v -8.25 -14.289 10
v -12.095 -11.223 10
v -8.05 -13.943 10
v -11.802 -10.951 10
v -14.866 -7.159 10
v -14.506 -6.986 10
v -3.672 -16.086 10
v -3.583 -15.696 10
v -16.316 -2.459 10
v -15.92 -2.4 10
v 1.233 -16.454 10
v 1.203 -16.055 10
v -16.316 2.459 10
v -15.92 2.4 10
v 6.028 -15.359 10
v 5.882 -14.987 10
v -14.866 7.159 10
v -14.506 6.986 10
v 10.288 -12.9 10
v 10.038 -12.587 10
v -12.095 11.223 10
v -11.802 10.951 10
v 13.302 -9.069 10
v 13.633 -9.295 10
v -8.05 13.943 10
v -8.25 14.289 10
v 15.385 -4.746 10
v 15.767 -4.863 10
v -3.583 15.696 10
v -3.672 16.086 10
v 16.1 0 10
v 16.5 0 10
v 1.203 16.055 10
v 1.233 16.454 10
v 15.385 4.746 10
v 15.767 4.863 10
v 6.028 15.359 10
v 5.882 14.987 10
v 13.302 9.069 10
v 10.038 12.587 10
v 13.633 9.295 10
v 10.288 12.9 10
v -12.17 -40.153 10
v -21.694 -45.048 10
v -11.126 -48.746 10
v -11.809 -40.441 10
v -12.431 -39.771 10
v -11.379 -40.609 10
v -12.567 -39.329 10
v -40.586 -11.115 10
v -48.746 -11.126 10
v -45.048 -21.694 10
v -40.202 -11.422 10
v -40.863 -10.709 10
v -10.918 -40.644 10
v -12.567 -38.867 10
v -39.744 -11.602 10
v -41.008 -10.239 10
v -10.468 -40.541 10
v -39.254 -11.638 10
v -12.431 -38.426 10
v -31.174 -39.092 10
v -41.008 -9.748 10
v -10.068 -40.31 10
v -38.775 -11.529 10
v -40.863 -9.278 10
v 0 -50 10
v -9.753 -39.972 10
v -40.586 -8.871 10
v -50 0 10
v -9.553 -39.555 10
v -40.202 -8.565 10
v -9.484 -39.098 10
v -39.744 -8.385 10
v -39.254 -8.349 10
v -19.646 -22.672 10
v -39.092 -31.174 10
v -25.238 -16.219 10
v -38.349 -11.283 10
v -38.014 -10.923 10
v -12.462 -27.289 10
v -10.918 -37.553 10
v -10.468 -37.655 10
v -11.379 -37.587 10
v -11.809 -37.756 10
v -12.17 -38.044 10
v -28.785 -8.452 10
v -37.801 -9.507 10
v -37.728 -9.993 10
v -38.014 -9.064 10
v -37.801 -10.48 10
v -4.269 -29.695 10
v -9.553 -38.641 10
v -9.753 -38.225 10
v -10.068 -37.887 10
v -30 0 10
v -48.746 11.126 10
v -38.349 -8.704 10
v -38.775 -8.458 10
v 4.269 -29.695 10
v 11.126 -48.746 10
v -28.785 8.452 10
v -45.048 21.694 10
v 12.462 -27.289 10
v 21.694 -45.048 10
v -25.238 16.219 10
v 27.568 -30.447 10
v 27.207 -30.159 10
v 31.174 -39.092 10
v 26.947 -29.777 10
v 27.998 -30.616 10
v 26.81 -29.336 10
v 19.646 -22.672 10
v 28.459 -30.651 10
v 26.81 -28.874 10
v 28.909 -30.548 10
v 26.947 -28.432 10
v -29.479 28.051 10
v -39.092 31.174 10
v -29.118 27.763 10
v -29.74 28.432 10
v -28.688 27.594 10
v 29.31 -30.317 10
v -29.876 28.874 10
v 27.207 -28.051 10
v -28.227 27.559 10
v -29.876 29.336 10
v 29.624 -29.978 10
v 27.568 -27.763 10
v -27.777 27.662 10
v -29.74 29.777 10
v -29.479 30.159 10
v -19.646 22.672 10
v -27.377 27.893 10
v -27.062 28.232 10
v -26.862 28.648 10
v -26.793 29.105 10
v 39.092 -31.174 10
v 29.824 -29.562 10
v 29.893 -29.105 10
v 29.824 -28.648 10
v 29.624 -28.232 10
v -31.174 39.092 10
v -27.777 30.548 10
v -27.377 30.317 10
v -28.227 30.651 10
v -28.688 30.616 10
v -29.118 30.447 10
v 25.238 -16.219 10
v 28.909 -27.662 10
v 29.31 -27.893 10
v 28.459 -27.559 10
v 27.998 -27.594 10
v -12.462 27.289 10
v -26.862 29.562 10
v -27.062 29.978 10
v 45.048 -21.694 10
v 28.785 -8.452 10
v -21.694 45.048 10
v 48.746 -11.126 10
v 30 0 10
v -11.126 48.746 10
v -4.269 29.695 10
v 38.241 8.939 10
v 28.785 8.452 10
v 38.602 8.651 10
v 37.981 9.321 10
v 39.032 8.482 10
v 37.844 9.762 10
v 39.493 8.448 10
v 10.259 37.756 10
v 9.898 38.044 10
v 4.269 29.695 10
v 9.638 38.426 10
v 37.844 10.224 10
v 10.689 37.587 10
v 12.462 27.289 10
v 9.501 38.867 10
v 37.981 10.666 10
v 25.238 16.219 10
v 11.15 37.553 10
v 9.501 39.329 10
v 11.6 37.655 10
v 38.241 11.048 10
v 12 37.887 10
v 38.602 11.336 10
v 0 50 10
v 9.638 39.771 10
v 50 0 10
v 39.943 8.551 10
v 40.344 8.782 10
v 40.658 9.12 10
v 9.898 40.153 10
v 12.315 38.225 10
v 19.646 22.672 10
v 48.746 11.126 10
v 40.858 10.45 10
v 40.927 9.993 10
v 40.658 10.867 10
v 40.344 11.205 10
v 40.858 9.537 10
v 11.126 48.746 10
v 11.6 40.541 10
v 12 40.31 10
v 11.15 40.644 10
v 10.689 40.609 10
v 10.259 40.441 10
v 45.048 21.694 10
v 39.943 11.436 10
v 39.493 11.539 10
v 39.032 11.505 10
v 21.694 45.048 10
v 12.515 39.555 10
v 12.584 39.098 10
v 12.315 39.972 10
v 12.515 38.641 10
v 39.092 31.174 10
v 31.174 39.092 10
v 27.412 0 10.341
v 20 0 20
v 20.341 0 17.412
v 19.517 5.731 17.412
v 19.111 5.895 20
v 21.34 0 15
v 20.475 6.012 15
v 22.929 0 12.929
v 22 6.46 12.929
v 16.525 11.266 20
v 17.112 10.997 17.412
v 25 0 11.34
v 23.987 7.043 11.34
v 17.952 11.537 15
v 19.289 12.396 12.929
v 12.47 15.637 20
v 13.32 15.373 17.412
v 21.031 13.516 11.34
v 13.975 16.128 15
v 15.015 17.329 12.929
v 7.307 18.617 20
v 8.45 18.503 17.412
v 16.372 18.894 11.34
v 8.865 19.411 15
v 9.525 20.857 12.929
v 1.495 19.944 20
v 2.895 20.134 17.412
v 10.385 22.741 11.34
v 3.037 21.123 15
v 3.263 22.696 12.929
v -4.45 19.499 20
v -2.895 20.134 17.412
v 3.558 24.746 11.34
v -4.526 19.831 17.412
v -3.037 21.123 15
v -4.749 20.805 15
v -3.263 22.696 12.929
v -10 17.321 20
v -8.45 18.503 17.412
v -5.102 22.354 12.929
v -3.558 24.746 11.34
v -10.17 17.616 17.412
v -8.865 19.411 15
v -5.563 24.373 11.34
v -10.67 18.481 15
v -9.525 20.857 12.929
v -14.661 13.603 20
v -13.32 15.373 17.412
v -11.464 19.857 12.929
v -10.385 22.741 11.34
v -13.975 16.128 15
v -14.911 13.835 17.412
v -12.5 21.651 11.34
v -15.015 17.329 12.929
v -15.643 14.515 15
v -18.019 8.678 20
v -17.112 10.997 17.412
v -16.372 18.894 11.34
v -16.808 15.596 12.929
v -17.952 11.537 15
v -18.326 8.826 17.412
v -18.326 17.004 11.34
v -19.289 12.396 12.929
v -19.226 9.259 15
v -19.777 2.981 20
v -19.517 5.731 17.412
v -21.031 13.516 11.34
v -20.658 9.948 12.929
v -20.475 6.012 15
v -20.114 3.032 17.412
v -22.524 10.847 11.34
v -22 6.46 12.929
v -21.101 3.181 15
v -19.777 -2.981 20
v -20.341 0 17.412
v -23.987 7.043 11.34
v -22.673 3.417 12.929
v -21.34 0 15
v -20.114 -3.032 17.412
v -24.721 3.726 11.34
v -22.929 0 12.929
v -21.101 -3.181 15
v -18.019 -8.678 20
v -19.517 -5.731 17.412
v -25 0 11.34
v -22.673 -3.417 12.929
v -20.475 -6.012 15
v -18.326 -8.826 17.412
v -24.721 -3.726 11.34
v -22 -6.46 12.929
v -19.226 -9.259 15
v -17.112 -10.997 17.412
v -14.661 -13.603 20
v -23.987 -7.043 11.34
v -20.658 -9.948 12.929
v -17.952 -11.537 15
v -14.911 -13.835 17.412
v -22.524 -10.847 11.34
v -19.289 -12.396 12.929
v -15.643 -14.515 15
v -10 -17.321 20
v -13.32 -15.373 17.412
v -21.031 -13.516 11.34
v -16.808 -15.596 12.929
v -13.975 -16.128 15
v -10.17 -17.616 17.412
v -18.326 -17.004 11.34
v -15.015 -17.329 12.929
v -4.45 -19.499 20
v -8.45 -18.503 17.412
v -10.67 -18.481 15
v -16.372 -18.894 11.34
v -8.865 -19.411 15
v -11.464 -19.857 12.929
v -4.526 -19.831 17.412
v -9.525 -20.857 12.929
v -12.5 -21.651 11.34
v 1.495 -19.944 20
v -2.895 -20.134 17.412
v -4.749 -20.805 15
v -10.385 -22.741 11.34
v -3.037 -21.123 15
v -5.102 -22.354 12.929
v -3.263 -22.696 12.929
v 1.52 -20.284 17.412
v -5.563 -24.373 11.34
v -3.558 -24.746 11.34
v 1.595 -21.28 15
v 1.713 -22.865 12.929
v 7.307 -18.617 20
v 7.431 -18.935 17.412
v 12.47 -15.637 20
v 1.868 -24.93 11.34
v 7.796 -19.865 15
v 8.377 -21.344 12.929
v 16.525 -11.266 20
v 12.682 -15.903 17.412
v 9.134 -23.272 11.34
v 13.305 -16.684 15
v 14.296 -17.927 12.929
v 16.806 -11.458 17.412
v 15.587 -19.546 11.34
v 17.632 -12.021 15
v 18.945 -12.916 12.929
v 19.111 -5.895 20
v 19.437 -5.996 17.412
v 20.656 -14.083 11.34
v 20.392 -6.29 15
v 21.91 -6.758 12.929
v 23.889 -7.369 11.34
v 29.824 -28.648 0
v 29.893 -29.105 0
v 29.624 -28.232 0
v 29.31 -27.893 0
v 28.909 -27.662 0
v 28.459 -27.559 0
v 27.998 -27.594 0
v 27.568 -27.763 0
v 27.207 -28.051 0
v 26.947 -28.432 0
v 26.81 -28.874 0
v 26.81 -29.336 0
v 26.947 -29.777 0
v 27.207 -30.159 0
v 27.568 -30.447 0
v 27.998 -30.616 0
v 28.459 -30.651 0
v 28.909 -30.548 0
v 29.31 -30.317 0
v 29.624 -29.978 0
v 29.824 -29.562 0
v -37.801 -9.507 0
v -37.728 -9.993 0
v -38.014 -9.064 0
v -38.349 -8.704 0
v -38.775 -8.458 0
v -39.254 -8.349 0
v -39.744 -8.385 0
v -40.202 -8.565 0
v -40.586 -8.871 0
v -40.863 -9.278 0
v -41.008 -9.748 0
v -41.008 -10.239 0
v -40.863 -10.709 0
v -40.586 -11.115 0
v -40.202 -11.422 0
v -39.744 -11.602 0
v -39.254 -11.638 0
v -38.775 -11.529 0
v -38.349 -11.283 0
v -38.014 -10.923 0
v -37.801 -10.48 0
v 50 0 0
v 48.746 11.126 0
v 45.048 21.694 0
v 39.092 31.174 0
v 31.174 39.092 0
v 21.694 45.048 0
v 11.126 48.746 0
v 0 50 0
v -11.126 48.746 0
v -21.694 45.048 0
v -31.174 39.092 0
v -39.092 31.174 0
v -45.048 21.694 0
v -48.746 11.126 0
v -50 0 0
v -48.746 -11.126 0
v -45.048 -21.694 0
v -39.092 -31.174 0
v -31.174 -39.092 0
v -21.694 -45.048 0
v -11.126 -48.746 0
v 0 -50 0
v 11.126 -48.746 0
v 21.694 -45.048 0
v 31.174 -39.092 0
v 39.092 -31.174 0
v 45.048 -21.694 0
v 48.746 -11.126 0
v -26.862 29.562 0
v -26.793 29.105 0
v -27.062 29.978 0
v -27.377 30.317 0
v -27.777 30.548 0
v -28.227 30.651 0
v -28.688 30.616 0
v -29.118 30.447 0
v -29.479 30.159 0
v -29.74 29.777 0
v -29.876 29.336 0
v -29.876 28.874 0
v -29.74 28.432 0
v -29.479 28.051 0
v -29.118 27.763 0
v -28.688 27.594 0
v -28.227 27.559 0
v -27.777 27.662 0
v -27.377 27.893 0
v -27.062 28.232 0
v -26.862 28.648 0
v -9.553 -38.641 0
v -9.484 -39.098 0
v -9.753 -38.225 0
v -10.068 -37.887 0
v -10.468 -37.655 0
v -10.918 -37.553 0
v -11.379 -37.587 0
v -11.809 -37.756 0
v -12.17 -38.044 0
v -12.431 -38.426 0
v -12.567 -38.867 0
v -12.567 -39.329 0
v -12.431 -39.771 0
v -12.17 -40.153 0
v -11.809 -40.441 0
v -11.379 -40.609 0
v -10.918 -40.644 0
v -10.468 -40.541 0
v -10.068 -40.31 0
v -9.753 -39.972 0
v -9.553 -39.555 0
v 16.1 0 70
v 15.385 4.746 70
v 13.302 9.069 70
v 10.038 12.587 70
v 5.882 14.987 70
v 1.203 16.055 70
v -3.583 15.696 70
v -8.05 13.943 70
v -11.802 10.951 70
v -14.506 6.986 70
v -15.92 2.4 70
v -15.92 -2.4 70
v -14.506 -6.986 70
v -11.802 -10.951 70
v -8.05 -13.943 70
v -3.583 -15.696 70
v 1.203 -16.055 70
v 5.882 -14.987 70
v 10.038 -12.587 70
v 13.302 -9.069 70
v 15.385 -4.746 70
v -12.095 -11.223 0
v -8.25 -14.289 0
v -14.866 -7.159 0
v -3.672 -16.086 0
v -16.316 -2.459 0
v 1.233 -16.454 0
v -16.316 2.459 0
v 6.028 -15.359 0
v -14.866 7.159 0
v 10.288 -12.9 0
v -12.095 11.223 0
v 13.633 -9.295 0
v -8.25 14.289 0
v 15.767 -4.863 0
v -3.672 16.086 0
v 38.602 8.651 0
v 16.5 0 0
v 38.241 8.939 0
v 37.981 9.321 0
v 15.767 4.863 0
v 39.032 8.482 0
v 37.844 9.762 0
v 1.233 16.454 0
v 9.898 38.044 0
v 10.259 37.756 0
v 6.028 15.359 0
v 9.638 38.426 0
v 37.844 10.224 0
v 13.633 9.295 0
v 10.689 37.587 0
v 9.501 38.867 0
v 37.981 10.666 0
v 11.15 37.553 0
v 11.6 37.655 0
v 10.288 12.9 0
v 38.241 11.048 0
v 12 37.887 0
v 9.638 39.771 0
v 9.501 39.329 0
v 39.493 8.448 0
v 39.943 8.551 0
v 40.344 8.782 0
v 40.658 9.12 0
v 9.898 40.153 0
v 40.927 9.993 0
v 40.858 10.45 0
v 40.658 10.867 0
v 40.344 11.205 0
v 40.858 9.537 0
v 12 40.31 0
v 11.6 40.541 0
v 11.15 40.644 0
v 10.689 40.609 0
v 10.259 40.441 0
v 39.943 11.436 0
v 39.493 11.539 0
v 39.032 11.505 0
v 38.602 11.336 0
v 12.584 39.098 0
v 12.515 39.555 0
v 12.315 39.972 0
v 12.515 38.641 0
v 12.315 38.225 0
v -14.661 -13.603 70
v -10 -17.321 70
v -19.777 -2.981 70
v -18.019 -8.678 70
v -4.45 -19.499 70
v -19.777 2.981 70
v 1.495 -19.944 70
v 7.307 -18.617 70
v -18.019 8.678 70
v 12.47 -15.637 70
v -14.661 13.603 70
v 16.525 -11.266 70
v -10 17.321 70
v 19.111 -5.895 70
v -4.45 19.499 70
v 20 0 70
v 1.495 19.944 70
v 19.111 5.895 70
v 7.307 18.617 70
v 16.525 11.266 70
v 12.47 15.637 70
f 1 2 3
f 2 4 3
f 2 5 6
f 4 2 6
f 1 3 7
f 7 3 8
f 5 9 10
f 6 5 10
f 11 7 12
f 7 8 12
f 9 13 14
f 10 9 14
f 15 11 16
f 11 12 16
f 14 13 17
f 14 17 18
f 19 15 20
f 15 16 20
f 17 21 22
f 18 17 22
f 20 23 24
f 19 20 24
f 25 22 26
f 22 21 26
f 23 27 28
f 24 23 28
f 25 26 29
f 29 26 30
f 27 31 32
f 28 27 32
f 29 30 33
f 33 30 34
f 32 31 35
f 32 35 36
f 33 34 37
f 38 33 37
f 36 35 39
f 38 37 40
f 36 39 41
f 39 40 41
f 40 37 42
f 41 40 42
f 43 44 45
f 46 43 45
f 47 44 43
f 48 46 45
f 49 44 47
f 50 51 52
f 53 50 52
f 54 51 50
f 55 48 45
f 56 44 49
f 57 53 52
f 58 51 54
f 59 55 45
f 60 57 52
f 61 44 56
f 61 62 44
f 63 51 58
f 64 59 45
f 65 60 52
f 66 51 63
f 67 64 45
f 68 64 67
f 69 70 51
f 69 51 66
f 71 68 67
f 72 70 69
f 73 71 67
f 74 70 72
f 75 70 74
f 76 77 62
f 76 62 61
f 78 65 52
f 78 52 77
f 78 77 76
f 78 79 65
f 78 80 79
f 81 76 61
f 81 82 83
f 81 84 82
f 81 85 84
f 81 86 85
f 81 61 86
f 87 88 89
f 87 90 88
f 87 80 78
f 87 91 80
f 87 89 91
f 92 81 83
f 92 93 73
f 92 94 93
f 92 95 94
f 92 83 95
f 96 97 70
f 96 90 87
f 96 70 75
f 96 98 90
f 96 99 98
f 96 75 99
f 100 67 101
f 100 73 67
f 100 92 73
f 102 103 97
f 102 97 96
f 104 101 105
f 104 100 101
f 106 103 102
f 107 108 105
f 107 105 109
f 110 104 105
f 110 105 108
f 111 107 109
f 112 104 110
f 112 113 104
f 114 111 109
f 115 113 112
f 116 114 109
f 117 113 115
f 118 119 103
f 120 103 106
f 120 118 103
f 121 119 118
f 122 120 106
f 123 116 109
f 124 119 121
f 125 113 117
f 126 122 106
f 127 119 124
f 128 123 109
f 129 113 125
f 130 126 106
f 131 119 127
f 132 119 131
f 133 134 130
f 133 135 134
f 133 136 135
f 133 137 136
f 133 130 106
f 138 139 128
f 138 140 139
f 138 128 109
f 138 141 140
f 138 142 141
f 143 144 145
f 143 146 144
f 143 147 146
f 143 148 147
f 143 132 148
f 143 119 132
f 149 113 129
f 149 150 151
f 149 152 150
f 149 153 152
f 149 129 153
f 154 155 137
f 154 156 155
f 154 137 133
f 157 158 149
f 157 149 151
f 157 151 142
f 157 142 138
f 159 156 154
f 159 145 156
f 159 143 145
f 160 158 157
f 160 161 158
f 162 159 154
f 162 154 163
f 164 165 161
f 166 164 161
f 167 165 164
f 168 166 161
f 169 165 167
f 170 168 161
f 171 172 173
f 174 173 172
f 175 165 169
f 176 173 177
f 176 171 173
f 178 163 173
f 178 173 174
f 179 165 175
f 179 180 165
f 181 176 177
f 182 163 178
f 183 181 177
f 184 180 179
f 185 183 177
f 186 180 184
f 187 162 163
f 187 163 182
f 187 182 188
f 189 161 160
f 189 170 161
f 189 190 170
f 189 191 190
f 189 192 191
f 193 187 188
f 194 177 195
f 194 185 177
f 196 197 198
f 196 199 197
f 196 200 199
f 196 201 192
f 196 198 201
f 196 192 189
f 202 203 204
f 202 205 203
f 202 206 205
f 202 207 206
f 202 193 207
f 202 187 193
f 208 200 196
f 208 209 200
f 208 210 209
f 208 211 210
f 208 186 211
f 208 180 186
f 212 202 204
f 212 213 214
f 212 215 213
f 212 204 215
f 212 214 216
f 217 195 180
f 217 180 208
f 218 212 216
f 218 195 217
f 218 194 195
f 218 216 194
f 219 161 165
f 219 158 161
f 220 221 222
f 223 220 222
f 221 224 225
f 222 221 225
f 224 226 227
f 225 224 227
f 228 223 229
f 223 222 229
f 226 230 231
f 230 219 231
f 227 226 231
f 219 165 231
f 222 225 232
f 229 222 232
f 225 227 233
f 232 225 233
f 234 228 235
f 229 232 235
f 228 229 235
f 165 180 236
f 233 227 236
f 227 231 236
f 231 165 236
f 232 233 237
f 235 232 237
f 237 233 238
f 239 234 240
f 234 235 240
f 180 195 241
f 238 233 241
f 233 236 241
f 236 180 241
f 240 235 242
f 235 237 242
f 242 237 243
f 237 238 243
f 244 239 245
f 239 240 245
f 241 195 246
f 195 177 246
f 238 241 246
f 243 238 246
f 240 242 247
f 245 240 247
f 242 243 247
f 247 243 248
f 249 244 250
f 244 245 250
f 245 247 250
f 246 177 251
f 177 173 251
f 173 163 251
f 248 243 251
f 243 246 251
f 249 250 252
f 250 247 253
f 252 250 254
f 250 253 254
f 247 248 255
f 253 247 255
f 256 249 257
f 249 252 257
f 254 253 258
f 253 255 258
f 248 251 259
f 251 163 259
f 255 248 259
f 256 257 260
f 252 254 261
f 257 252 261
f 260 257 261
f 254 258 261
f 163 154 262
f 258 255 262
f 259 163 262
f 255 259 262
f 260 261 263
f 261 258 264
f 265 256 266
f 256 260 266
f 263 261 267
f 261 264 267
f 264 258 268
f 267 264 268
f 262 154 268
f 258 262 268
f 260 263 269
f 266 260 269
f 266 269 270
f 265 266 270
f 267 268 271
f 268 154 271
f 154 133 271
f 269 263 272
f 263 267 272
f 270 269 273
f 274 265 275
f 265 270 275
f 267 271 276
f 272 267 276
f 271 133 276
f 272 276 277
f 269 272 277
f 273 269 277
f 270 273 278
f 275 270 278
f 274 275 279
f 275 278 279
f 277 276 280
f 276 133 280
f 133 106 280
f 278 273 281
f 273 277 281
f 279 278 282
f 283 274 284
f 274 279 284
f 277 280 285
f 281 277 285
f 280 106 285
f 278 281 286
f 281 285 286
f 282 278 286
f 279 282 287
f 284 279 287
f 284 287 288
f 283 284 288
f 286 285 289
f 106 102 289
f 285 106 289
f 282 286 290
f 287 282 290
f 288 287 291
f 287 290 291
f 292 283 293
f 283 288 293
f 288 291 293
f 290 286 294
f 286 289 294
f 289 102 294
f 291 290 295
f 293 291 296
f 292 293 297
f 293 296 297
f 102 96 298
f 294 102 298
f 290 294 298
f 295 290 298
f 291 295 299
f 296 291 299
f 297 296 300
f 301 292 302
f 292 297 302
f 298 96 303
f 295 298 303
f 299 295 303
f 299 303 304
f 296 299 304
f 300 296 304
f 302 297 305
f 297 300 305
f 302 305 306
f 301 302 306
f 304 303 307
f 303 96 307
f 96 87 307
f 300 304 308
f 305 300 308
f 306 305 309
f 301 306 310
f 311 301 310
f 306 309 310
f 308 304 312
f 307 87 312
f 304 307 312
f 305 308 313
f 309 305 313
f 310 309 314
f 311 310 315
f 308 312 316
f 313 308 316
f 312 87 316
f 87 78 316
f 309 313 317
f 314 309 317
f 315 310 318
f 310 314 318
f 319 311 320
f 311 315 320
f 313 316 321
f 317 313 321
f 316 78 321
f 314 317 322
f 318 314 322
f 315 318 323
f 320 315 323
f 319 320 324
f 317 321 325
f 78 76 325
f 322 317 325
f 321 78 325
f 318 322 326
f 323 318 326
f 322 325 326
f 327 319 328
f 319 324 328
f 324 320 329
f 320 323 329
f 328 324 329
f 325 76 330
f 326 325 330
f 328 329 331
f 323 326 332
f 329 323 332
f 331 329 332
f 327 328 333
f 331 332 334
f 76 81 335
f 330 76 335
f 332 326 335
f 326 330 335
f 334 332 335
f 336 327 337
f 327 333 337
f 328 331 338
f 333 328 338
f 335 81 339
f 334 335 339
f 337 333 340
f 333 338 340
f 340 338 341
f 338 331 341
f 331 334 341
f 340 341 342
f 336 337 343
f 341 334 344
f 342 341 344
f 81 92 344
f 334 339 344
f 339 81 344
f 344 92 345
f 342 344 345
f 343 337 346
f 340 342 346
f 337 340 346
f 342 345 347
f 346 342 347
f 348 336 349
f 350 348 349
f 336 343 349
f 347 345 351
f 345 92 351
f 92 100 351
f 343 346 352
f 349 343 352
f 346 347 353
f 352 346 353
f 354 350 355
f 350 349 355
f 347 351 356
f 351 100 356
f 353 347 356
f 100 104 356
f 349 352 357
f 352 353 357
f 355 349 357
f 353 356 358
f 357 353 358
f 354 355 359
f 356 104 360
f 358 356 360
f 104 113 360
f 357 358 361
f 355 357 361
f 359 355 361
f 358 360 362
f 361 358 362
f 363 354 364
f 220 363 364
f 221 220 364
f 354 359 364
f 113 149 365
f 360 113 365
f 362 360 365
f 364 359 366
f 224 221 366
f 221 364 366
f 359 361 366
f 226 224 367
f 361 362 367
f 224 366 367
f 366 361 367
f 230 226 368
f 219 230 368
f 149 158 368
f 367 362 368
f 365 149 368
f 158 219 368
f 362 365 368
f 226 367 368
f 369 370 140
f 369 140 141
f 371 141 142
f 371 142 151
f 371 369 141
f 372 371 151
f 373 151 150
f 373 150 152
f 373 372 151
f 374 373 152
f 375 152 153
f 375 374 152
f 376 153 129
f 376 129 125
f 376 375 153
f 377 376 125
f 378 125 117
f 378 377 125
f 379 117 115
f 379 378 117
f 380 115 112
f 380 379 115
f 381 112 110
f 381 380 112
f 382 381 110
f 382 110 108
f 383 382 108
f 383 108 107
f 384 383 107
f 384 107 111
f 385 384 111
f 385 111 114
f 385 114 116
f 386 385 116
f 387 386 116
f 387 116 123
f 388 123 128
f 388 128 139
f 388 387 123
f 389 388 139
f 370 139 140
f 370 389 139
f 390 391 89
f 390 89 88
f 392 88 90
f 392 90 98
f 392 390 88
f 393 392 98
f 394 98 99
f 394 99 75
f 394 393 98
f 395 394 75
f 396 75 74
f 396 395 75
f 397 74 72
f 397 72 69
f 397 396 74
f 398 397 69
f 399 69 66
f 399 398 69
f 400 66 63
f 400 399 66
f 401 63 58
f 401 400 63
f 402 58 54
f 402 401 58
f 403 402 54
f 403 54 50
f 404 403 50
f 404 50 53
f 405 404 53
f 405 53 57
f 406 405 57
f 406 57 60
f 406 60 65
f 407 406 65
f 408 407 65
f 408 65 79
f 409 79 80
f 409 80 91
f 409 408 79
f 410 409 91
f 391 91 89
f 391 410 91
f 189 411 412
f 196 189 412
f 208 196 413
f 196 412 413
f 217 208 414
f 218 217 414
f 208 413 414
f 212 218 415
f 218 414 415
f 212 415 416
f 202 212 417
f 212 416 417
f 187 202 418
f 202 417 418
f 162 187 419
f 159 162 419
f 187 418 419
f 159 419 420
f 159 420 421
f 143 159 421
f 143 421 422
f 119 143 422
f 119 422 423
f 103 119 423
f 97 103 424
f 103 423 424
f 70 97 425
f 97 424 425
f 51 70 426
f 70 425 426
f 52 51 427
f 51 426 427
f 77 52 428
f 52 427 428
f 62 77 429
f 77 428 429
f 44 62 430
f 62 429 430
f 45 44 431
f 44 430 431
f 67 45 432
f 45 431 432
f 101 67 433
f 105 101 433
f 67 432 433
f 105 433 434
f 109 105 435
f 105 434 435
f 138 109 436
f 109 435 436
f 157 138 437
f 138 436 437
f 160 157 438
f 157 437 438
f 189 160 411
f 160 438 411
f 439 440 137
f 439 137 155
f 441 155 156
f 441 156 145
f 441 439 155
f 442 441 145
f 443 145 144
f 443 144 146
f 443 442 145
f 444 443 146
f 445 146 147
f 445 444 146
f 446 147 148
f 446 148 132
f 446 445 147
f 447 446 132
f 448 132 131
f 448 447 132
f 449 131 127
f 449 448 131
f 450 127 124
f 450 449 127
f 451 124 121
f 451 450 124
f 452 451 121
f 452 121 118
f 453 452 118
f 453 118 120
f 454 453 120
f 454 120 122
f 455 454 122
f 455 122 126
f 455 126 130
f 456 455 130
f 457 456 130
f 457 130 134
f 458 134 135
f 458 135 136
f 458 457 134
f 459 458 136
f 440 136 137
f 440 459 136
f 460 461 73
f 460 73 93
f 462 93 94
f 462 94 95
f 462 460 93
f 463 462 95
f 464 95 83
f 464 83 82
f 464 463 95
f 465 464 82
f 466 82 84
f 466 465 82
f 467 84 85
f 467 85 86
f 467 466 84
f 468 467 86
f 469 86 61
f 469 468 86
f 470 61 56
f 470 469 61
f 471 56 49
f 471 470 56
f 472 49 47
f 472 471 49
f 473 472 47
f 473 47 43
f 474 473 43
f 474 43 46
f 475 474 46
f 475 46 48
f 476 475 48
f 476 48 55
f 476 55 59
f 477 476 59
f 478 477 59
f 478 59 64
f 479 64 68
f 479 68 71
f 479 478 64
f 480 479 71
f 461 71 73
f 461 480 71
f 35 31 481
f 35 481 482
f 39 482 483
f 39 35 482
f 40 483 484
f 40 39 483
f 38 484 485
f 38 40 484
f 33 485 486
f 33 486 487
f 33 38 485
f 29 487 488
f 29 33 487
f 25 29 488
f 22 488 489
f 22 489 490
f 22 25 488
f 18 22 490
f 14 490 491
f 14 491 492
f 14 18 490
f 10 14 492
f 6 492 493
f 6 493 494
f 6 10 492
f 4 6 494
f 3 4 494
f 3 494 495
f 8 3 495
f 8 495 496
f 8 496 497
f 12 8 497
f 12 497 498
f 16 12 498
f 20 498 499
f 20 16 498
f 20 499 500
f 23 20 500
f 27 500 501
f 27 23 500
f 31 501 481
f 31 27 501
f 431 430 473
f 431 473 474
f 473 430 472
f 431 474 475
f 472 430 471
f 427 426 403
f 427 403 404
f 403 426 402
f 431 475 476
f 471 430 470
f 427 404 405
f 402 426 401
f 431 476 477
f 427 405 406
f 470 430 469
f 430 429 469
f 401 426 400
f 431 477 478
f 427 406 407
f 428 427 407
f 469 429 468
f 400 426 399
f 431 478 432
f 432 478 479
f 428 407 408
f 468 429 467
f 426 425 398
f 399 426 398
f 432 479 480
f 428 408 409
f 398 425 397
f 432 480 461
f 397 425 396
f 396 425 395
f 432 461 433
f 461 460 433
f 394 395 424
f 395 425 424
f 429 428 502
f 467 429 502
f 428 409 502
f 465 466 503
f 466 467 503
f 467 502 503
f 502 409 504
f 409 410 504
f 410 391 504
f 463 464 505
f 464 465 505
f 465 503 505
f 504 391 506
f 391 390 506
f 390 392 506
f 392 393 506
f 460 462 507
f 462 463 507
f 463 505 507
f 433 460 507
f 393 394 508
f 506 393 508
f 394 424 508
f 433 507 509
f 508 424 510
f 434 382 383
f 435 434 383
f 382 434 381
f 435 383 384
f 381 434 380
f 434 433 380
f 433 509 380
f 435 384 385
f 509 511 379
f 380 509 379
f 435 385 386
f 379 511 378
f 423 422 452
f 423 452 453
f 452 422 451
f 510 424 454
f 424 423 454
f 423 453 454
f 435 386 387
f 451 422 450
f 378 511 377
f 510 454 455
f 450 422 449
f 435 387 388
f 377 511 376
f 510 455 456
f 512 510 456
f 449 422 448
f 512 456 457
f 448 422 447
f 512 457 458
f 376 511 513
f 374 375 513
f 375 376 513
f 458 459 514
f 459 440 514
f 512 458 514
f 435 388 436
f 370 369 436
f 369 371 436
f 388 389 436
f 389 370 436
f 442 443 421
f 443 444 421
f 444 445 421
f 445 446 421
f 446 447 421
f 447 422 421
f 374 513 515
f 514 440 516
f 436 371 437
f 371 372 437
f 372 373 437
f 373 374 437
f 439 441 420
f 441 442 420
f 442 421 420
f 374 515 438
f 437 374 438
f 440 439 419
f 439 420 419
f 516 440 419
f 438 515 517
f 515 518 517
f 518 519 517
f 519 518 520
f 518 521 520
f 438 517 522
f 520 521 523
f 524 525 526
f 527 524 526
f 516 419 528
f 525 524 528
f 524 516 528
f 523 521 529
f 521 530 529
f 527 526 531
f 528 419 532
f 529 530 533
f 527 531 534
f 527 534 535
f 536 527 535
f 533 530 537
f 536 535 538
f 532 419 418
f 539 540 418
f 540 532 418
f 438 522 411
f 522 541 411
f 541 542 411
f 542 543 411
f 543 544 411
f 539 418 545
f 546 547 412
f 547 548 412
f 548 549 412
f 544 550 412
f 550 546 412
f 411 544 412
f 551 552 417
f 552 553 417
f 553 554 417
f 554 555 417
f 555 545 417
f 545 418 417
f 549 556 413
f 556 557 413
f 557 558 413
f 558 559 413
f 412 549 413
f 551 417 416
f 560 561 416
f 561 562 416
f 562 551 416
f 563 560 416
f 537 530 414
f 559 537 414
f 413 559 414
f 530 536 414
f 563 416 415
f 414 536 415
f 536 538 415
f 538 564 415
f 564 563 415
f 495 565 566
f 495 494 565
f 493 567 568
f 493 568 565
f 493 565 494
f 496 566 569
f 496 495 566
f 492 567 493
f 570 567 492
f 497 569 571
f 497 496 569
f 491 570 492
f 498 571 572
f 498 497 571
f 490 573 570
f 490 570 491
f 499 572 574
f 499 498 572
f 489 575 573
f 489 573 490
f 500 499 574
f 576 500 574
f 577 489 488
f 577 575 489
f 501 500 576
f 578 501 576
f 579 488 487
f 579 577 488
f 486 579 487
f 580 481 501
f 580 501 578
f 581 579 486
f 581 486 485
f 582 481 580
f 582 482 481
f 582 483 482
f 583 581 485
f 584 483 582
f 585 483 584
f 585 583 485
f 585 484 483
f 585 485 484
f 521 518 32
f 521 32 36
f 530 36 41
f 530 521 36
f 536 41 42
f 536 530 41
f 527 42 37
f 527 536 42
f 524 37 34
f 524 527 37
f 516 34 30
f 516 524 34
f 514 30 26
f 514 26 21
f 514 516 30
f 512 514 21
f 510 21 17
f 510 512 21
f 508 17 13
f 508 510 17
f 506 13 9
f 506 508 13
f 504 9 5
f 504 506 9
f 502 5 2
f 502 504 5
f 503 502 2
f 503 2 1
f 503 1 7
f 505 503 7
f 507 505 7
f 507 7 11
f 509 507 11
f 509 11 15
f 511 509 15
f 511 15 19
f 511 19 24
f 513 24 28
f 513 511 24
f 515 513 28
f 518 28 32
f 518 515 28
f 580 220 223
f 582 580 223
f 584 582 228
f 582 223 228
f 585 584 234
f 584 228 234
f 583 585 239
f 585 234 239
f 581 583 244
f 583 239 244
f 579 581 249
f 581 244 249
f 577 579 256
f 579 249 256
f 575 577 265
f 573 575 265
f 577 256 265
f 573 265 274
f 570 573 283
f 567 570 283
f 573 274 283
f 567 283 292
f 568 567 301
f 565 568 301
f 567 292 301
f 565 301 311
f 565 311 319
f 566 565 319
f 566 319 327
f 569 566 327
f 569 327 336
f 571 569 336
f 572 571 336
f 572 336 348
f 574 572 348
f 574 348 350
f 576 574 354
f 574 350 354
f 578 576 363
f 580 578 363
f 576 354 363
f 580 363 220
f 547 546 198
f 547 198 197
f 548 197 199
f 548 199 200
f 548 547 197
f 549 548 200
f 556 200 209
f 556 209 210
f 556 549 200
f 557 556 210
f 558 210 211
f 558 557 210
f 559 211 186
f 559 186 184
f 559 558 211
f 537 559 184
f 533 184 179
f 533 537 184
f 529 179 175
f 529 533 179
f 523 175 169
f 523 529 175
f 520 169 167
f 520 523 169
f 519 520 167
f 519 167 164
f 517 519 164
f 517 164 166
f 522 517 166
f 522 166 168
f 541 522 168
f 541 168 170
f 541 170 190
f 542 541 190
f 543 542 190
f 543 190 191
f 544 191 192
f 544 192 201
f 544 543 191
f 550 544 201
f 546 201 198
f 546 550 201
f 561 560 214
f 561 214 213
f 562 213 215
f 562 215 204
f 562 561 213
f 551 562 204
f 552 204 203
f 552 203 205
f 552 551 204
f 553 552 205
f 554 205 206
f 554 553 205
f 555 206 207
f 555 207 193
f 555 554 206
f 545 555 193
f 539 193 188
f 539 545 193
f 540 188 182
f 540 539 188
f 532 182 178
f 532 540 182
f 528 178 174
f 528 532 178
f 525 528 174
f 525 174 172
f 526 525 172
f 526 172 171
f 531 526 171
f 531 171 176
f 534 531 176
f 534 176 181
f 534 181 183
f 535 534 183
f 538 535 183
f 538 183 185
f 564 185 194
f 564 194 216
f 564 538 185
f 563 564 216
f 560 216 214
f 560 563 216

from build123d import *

# Parameters (mm, degrees)
SKETCH1_R           = 50
SKETCH1_R_2         = 16.5
SKETCH1_R_3         = 1.55
SKETCH1_R_4         = 1.649528324
BOSS_EXTRUDE1_DEPTH = 10
SKETCH2_R           = 20
SKETCH2_R_2         = 16.1
BOSS_EXTRUDE2_DEPTH = 60
FILLET1_R           = 10


with BuildPart() as part:
    # Sketch1 → Boss-Extrude1 (new body)
    with BuildSketch(Plane.XY):
        Circle(SKETCH1_R)
        Circle(SKETCH1_R_2, mode=Mode.SUBTRACT)
        with Locations((-11.034036049, -39.098354169)):
            Circle(SKETCH1_R_3, mode=Mode.SUBTRACT)
        with Locations((-39.377185981, -9.99342156)):
            Circle(SKETCH1_R_4, mode=Mode.SUBTRACT)
        with Locations((-28.343149932, 29.104932609)):
            Circle(SKETCH1_R_3, mode=Mode.SUBTRACT)
        with Locations((11.034036049, 39.098354169)):
            Circle(SKETCH1_R_3, mode=Mode.SUBTRACT)
        with Locations((39.377185981, 9.99342156)):
            Circle(SKETCH1_R_3, mode=Mode.SUBTRACT)
        with Locations((28.343149932, -29.104932609)):
            Circle(SKETCH1_R_3, mode=Mode.SUBTRACT)
    extrude(amount=BOSS_EXTRUDE1_DEPTH)

    # Sketch2 → Boss-Extrude2 (add)
    with BuildSketch(Plane.XY.offset(10)):
        Circle(SKETCH2_R)
        Circle(SKETCH2_R_2, mode=Mode.SUBTRACT)
    extrude(amount=BOSS_EXTRUDE2_DEPTH)

    # Fillet1
    fillet1_edges = [part.edges().sort_by_distance(p)[0] for p in [
        (-20, 0, 10),
    ]]
    fillet(fillet1_edges, radius=FILLET1_R)


solid = part.part
